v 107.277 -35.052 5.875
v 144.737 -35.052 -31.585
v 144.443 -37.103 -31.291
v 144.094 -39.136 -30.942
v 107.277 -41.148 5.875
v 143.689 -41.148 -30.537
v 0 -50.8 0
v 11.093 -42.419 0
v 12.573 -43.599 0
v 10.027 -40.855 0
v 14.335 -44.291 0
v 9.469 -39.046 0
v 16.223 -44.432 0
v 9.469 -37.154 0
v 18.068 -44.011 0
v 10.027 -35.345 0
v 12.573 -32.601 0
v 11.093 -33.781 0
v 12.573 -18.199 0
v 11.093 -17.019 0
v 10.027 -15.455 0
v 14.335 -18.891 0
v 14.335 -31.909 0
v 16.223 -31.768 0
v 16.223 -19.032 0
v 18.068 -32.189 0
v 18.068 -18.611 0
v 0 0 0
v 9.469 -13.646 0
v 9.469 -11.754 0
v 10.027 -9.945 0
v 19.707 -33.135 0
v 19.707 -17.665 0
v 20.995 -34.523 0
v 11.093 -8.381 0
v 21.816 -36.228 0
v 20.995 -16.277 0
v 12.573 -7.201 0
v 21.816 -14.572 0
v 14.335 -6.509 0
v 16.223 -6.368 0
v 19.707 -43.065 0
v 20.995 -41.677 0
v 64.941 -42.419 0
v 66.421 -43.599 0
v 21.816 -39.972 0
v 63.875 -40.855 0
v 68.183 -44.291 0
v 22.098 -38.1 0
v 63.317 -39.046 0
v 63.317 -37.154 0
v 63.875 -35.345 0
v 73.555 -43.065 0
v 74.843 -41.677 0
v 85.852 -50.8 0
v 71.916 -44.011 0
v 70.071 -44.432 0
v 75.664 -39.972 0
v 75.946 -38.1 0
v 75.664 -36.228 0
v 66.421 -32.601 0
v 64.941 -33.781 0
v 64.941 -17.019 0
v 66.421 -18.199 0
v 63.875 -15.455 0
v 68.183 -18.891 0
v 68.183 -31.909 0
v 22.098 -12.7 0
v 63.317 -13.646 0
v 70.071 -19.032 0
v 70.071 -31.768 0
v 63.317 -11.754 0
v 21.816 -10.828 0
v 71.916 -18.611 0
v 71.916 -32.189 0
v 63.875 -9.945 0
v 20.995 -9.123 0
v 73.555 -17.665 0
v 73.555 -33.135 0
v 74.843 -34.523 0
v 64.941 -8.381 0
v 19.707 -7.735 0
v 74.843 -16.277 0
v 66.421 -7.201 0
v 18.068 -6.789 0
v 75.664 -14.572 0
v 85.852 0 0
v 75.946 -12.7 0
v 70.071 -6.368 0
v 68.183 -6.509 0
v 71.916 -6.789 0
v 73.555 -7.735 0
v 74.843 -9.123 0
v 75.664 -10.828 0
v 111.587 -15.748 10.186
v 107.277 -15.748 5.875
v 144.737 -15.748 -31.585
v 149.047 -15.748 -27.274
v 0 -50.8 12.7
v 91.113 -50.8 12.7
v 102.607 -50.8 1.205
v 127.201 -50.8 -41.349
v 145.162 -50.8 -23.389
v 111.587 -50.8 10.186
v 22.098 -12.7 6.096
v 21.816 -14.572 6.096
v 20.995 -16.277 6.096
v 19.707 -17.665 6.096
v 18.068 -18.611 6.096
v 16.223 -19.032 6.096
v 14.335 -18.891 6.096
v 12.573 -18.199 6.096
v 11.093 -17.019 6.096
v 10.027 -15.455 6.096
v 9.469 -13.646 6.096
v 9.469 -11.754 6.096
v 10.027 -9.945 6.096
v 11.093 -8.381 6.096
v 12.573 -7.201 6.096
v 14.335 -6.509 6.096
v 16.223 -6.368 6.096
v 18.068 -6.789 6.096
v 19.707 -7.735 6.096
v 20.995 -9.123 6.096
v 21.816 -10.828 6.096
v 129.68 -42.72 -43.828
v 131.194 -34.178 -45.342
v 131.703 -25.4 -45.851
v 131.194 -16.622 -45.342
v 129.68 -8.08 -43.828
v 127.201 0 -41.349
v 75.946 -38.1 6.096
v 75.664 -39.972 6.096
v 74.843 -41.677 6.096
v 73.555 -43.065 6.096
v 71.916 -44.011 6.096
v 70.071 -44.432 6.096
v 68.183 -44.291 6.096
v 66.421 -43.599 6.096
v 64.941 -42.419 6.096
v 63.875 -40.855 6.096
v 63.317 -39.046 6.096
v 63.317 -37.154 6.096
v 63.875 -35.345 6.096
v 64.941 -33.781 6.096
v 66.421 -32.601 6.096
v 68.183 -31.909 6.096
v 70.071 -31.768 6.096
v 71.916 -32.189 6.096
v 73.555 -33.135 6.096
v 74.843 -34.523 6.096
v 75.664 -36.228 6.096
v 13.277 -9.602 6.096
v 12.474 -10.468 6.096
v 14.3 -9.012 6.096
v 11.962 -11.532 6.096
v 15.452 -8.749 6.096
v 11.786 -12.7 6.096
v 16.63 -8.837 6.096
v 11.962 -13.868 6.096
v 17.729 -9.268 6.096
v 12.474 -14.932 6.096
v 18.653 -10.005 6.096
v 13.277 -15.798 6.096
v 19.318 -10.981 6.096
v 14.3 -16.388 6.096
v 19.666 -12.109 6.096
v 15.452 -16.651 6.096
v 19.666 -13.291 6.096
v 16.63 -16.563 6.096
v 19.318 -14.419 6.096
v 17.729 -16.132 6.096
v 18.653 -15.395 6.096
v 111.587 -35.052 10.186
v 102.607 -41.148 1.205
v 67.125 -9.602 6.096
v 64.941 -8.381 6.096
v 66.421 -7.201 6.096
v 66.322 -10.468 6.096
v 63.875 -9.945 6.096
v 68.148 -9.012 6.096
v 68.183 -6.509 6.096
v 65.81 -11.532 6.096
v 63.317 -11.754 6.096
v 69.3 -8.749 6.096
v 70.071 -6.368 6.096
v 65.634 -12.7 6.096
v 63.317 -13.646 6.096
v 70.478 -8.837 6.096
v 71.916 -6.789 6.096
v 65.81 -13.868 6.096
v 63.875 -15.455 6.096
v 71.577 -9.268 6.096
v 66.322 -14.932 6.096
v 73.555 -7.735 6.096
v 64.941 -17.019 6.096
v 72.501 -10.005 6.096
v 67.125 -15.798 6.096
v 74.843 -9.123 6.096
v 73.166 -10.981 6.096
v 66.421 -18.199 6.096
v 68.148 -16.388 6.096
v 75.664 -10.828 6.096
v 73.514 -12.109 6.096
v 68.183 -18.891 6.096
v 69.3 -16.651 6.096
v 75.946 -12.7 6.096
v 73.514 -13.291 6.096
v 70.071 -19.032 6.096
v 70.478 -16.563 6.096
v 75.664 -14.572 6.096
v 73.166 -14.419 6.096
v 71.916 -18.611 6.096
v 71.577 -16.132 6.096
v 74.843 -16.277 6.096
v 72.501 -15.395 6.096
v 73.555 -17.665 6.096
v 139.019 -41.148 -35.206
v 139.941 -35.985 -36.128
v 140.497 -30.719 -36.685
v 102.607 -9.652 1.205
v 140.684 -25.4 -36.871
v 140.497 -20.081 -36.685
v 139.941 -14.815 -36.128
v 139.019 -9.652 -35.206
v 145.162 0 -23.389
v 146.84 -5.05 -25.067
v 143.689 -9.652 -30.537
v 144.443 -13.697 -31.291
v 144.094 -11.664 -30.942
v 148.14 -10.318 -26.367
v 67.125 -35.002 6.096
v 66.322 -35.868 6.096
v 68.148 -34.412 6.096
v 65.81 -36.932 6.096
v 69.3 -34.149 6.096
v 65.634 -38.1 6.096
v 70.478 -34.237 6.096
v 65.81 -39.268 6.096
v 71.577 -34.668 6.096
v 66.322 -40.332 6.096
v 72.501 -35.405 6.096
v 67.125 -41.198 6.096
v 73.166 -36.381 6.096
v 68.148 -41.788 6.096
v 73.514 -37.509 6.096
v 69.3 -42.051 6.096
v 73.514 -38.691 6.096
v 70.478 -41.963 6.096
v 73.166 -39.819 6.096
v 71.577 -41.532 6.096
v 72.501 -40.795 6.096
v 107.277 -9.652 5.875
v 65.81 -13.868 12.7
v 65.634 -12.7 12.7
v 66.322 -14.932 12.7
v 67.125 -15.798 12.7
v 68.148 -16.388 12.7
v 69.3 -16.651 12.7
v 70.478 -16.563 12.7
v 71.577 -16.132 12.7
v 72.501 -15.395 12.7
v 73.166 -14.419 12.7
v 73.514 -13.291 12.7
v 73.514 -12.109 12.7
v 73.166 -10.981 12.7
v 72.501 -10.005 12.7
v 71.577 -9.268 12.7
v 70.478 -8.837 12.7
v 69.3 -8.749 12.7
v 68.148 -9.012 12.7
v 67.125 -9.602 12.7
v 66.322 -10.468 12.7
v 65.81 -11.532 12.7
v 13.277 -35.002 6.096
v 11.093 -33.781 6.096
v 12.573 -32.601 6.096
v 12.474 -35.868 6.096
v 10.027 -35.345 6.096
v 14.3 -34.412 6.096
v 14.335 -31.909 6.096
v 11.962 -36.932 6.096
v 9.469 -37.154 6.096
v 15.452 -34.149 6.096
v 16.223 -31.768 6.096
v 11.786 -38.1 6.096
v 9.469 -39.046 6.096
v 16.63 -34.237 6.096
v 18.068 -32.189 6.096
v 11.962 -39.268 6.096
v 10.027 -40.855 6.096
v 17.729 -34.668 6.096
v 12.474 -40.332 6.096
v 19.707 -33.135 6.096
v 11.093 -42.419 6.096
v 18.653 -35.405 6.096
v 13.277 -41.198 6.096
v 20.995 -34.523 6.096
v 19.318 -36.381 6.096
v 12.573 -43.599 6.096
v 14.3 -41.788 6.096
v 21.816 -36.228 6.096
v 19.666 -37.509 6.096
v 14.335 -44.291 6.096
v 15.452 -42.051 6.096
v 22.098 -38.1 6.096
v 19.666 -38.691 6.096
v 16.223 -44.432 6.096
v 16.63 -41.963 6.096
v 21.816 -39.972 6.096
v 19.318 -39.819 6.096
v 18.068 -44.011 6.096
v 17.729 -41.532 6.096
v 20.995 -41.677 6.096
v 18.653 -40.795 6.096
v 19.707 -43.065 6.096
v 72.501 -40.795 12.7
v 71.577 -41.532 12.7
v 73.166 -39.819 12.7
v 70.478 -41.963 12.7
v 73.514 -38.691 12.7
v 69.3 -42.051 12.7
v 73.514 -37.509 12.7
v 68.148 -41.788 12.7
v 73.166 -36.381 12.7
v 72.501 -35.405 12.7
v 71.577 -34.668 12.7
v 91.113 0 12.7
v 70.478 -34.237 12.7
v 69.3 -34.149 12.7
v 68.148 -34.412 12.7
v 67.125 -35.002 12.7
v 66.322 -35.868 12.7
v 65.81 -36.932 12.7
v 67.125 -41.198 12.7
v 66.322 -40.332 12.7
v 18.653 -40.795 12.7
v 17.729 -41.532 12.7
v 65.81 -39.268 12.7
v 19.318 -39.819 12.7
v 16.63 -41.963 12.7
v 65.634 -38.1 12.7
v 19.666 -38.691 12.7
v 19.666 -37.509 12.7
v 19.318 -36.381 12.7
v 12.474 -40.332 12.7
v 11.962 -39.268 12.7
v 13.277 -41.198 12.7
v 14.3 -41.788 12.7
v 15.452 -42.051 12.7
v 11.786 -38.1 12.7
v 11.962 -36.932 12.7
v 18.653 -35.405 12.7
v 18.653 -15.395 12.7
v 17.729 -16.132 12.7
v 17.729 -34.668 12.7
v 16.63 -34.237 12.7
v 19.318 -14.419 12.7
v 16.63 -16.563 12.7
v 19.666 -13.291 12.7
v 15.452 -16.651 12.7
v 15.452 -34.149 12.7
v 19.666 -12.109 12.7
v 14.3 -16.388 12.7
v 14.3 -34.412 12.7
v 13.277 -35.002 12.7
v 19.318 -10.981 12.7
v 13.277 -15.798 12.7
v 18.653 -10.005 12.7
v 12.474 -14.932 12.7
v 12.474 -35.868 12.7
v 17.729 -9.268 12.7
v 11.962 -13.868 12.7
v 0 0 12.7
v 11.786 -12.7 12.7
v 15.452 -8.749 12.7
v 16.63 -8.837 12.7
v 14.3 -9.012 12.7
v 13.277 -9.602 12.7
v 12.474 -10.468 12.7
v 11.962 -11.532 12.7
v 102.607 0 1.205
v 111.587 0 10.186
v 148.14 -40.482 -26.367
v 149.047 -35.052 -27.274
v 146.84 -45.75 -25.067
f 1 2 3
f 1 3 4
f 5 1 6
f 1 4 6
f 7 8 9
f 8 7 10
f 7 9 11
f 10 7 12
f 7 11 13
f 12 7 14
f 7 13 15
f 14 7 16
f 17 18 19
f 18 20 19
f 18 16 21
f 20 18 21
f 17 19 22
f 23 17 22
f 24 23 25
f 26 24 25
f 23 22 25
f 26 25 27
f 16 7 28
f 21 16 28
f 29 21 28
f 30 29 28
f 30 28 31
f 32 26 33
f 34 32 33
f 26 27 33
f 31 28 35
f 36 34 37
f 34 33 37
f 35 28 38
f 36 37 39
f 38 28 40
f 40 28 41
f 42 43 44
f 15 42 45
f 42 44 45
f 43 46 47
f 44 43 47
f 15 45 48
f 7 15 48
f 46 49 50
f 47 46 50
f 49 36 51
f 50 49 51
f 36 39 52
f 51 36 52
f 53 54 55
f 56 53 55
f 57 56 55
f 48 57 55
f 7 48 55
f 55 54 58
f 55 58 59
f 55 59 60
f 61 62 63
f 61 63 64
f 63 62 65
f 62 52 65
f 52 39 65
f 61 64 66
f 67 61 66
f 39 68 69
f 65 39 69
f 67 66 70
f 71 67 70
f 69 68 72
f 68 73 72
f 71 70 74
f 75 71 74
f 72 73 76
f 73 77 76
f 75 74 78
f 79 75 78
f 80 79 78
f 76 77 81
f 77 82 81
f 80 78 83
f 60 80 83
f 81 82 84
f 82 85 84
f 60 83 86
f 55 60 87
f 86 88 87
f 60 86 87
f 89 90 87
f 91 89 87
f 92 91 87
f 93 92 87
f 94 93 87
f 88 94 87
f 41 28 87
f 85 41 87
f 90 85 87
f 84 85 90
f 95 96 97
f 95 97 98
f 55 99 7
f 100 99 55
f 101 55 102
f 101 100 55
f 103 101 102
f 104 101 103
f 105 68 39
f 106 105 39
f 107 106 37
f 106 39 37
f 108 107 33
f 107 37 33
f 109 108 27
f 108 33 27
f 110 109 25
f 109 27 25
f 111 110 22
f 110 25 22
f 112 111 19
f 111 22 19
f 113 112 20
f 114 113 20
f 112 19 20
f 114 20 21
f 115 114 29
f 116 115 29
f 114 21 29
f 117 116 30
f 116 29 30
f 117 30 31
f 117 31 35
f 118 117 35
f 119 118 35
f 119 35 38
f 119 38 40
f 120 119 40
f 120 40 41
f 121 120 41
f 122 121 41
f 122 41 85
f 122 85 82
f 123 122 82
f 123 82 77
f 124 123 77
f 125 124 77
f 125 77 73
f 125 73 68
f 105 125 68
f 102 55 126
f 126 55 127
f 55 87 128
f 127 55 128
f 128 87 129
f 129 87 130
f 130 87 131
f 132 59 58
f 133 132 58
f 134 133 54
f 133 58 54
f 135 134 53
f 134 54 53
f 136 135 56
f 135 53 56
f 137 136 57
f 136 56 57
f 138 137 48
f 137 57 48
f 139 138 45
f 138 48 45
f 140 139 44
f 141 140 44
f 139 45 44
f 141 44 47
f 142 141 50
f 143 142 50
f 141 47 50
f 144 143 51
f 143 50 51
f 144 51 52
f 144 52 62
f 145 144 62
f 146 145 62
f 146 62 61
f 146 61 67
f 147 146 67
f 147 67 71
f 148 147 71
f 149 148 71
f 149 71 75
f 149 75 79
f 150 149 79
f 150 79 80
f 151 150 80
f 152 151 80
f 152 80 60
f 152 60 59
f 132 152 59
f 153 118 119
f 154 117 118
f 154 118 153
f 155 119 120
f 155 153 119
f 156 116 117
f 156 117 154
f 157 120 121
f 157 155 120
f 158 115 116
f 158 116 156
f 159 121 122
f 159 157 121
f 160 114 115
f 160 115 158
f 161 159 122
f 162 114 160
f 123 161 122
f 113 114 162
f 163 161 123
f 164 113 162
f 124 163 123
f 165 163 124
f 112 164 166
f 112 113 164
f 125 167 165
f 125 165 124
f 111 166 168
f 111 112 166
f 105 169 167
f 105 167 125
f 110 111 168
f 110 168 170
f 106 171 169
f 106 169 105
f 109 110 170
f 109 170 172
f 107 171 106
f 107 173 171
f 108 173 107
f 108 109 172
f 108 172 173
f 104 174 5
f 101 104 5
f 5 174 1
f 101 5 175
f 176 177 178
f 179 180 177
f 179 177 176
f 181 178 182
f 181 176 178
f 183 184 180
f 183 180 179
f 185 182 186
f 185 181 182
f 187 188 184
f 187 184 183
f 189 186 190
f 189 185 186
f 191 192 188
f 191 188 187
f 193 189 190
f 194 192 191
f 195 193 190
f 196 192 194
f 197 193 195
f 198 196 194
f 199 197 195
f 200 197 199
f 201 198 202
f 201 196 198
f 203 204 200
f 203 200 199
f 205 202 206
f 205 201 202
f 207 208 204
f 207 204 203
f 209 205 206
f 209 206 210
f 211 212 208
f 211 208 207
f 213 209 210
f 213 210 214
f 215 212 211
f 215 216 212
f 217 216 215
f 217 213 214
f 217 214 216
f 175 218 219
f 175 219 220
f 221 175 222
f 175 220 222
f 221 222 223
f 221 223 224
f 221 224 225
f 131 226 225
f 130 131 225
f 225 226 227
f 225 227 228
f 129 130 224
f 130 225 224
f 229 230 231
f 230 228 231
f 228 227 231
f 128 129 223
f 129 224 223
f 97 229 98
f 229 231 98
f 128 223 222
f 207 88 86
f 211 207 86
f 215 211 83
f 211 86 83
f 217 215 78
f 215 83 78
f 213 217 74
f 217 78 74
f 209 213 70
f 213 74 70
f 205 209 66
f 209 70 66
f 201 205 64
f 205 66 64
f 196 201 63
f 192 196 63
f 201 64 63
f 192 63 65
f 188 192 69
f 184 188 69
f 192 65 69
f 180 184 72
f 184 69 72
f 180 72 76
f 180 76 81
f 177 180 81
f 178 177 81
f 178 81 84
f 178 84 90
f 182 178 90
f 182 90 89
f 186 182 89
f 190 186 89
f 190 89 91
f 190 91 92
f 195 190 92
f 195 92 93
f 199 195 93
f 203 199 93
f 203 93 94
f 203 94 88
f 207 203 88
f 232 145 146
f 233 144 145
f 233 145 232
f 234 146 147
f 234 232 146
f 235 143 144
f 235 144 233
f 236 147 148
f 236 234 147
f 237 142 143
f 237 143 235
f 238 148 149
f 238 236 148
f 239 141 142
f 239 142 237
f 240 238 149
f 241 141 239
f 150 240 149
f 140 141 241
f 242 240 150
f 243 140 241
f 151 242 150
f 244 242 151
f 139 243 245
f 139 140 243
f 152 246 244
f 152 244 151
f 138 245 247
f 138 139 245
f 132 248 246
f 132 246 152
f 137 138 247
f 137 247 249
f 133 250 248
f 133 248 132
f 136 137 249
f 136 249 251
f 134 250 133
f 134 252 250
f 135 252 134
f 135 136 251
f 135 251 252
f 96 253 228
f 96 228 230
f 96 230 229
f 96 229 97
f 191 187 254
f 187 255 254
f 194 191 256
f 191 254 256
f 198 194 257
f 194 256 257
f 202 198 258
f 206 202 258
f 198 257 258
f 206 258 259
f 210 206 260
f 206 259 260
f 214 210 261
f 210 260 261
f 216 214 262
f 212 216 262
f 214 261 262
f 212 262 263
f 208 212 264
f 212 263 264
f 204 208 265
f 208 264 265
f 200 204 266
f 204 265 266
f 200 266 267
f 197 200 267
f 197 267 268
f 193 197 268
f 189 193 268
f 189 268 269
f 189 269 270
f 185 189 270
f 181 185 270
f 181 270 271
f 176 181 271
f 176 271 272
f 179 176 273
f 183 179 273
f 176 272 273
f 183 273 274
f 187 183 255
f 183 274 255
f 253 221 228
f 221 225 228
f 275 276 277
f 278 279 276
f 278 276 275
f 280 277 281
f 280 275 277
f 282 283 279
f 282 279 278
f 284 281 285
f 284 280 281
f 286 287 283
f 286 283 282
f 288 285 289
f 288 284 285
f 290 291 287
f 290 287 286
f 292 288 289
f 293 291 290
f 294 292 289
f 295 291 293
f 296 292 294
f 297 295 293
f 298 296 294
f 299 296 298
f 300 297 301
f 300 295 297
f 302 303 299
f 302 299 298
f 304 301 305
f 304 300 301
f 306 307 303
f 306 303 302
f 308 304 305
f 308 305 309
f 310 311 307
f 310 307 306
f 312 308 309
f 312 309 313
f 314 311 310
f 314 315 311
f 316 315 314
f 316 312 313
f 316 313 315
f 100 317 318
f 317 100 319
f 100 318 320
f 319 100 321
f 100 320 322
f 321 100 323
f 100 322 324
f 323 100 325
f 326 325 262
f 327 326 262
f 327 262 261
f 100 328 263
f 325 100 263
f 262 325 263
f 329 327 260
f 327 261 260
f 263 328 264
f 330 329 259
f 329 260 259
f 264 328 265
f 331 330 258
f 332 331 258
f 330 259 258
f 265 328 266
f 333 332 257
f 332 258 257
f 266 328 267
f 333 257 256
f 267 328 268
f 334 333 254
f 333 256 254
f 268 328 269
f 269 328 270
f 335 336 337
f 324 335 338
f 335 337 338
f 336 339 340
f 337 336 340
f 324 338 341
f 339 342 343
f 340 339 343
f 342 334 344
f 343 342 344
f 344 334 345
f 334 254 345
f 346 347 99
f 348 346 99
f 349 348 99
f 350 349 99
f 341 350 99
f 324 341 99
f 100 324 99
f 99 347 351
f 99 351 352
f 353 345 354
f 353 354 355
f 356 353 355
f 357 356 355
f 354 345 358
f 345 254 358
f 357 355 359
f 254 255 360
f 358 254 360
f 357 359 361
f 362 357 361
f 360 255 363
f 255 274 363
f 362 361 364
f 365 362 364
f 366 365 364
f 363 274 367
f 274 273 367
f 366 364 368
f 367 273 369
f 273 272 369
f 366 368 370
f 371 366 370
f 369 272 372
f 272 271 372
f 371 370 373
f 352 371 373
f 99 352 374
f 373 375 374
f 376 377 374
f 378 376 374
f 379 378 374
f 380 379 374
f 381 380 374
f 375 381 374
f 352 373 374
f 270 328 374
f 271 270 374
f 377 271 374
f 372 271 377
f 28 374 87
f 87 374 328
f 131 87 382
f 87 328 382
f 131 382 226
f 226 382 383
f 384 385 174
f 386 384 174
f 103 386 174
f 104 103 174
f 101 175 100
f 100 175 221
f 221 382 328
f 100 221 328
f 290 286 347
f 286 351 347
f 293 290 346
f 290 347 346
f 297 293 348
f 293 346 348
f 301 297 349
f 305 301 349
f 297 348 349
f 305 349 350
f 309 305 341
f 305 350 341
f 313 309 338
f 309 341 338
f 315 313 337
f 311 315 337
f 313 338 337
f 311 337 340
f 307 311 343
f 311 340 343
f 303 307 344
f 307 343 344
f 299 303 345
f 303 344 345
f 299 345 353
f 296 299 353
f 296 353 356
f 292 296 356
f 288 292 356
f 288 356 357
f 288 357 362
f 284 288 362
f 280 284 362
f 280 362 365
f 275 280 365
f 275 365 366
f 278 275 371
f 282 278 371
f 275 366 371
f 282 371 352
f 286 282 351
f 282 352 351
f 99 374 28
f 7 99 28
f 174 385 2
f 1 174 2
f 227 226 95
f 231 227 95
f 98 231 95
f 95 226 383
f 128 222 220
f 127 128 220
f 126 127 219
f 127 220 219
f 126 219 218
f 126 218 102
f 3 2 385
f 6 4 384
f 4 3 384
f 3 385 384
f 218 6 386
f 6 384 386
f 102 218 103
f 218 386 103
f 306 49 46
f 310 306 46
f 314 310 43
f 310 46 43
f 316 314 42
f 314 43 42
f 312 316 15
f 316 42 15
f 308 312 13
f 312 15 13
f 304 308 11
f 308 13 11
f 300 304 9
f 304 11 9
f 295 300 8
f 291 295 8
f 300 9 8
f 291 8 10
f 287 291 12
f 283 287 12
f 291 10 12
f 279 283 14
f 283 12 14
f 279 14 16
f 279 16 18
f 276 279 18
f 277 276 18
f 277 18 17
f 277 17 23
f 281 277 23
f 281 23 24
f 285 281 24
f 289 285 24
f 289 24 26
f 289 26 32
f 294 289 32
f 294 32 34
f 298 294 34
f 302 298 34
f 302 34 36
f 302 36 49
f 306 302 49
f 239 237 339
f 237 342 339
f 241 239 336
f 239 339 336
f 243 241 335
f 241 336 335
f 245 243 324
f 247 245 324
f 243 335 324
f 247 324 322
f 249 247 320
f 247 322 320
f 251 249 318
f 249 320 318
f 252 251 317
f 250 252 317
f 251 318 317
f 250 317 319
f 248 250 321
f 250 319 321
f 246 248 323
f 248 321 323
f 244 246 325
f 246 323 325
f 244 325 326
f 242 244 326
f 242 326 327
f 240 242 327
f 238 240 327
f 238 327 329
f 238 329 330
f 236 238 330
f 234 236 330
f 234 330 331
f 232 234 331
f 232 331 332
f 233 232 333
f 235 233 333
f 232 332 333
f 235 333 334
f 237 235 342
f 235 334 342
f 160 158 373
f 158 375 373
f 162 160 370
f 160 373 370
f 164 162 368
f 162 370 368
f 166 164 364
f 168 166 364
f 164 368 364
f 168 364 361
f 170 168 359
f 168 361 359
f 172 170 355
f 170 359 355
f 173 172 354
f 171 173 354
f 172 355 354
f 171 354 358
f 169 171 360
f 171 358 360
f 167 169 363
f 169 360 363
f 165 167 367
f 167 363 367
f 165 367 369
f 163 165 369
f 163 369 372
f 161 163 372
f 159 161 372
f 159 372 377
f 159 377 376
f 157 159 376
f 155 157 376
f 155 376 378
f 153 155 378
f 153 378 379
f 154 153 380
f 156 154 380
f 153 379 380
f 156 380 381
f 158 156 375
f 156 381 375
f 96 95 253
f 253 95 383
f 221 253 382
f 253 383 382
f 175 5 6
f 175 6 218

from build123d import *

# Parameters (mm, degrees)
F1_DEPTH       = 50.8
F3_D           = 7.9248
F3_CBORE_D     = 12.7
F3_CBORE_DEPTH = 6.096
F5_DEPTH       = 134.531275
F7_DEPTH       = 118.529275


with BuildPart() as f1:
    # F0 (on Front) → F1 (new body)
    with BuildSketch(Plane.XZ):
        Polygon((0, 0), (85.852, 0), (131.70327, -45.85127), (140.683526, -36.871014), (102.60724, 1.205272), (91.112512, 12.7), (0, 12.7), align=None)
        Polygon((102.60724, 1.205272), (140.683526, -36.871014), (149.663782, -27.890758), (111.587496, 10.185528), align=None)
    extrude(amount=F1_DEPTH)

    # F3 (through all)
    with Locations(Plane(origin=(0, 0, 0), x_dir=(1, 0, 0), z_dir=(0, 0, -1))):
        with Locations((15.748, 38.1), (69.596, 38.1), (69.596, 12.7), (15.748, 12.7)):
            CounterBoreHole(F3_D / 2, F3_CBORE_D / 2, F3_CBORE_DEPTH)

    # F4 (on face) → F5 (cut, through all)
    with BuildSketch(Plane(origin=(88.77727, 0, -88.77727), x_dir=(0, 1, 0), z_dir=(0.707107, 0, -0.707107))):
        Polygon((-15.748, 86.106531), (-35.052, 86.106531), (-35.052, 80.010531), (-41.148, 80.010531), (-41.148, 73.406531), (-9.652, 73.406531), (-9.652, 80.010531), (-15.748, 80.010531), align=None)
    extrude(amount=-F5_DEPTH, mode=Mode.SUBTRACT)

    # F6 (on face) → F7 (cut, through all)
    with BuildSketch(Plane(origin=(60.886512, 0, 60.886512), x_dir=(0.707107, 0, -0.707107), z_dir=(0.707107, 0, 0.707107))):
        with BuildLine():
            ThreePointArc((119.183037, 0), (123.934026, -12.307078), (125.550019, -25.4))
            Line((125.550019, -25.4), (125.550019, 0))
            Line((125.550019, 0), (119.183037, 0))
        make_face()
        with BuildLine():
            ThreePointArc((125.550019, -25.4), (123.934026, -38.492922), (119.183037, -50.8))
            Line((119.183037, -50.8), (125.550019, -50.8))
            Line((125.550019, -50.8), (125.550019, -25.4))
        make_face()
    extrude(amount=-F7_DEPTH, mode=Mode.SUBTRACT)


solid = f1.part
